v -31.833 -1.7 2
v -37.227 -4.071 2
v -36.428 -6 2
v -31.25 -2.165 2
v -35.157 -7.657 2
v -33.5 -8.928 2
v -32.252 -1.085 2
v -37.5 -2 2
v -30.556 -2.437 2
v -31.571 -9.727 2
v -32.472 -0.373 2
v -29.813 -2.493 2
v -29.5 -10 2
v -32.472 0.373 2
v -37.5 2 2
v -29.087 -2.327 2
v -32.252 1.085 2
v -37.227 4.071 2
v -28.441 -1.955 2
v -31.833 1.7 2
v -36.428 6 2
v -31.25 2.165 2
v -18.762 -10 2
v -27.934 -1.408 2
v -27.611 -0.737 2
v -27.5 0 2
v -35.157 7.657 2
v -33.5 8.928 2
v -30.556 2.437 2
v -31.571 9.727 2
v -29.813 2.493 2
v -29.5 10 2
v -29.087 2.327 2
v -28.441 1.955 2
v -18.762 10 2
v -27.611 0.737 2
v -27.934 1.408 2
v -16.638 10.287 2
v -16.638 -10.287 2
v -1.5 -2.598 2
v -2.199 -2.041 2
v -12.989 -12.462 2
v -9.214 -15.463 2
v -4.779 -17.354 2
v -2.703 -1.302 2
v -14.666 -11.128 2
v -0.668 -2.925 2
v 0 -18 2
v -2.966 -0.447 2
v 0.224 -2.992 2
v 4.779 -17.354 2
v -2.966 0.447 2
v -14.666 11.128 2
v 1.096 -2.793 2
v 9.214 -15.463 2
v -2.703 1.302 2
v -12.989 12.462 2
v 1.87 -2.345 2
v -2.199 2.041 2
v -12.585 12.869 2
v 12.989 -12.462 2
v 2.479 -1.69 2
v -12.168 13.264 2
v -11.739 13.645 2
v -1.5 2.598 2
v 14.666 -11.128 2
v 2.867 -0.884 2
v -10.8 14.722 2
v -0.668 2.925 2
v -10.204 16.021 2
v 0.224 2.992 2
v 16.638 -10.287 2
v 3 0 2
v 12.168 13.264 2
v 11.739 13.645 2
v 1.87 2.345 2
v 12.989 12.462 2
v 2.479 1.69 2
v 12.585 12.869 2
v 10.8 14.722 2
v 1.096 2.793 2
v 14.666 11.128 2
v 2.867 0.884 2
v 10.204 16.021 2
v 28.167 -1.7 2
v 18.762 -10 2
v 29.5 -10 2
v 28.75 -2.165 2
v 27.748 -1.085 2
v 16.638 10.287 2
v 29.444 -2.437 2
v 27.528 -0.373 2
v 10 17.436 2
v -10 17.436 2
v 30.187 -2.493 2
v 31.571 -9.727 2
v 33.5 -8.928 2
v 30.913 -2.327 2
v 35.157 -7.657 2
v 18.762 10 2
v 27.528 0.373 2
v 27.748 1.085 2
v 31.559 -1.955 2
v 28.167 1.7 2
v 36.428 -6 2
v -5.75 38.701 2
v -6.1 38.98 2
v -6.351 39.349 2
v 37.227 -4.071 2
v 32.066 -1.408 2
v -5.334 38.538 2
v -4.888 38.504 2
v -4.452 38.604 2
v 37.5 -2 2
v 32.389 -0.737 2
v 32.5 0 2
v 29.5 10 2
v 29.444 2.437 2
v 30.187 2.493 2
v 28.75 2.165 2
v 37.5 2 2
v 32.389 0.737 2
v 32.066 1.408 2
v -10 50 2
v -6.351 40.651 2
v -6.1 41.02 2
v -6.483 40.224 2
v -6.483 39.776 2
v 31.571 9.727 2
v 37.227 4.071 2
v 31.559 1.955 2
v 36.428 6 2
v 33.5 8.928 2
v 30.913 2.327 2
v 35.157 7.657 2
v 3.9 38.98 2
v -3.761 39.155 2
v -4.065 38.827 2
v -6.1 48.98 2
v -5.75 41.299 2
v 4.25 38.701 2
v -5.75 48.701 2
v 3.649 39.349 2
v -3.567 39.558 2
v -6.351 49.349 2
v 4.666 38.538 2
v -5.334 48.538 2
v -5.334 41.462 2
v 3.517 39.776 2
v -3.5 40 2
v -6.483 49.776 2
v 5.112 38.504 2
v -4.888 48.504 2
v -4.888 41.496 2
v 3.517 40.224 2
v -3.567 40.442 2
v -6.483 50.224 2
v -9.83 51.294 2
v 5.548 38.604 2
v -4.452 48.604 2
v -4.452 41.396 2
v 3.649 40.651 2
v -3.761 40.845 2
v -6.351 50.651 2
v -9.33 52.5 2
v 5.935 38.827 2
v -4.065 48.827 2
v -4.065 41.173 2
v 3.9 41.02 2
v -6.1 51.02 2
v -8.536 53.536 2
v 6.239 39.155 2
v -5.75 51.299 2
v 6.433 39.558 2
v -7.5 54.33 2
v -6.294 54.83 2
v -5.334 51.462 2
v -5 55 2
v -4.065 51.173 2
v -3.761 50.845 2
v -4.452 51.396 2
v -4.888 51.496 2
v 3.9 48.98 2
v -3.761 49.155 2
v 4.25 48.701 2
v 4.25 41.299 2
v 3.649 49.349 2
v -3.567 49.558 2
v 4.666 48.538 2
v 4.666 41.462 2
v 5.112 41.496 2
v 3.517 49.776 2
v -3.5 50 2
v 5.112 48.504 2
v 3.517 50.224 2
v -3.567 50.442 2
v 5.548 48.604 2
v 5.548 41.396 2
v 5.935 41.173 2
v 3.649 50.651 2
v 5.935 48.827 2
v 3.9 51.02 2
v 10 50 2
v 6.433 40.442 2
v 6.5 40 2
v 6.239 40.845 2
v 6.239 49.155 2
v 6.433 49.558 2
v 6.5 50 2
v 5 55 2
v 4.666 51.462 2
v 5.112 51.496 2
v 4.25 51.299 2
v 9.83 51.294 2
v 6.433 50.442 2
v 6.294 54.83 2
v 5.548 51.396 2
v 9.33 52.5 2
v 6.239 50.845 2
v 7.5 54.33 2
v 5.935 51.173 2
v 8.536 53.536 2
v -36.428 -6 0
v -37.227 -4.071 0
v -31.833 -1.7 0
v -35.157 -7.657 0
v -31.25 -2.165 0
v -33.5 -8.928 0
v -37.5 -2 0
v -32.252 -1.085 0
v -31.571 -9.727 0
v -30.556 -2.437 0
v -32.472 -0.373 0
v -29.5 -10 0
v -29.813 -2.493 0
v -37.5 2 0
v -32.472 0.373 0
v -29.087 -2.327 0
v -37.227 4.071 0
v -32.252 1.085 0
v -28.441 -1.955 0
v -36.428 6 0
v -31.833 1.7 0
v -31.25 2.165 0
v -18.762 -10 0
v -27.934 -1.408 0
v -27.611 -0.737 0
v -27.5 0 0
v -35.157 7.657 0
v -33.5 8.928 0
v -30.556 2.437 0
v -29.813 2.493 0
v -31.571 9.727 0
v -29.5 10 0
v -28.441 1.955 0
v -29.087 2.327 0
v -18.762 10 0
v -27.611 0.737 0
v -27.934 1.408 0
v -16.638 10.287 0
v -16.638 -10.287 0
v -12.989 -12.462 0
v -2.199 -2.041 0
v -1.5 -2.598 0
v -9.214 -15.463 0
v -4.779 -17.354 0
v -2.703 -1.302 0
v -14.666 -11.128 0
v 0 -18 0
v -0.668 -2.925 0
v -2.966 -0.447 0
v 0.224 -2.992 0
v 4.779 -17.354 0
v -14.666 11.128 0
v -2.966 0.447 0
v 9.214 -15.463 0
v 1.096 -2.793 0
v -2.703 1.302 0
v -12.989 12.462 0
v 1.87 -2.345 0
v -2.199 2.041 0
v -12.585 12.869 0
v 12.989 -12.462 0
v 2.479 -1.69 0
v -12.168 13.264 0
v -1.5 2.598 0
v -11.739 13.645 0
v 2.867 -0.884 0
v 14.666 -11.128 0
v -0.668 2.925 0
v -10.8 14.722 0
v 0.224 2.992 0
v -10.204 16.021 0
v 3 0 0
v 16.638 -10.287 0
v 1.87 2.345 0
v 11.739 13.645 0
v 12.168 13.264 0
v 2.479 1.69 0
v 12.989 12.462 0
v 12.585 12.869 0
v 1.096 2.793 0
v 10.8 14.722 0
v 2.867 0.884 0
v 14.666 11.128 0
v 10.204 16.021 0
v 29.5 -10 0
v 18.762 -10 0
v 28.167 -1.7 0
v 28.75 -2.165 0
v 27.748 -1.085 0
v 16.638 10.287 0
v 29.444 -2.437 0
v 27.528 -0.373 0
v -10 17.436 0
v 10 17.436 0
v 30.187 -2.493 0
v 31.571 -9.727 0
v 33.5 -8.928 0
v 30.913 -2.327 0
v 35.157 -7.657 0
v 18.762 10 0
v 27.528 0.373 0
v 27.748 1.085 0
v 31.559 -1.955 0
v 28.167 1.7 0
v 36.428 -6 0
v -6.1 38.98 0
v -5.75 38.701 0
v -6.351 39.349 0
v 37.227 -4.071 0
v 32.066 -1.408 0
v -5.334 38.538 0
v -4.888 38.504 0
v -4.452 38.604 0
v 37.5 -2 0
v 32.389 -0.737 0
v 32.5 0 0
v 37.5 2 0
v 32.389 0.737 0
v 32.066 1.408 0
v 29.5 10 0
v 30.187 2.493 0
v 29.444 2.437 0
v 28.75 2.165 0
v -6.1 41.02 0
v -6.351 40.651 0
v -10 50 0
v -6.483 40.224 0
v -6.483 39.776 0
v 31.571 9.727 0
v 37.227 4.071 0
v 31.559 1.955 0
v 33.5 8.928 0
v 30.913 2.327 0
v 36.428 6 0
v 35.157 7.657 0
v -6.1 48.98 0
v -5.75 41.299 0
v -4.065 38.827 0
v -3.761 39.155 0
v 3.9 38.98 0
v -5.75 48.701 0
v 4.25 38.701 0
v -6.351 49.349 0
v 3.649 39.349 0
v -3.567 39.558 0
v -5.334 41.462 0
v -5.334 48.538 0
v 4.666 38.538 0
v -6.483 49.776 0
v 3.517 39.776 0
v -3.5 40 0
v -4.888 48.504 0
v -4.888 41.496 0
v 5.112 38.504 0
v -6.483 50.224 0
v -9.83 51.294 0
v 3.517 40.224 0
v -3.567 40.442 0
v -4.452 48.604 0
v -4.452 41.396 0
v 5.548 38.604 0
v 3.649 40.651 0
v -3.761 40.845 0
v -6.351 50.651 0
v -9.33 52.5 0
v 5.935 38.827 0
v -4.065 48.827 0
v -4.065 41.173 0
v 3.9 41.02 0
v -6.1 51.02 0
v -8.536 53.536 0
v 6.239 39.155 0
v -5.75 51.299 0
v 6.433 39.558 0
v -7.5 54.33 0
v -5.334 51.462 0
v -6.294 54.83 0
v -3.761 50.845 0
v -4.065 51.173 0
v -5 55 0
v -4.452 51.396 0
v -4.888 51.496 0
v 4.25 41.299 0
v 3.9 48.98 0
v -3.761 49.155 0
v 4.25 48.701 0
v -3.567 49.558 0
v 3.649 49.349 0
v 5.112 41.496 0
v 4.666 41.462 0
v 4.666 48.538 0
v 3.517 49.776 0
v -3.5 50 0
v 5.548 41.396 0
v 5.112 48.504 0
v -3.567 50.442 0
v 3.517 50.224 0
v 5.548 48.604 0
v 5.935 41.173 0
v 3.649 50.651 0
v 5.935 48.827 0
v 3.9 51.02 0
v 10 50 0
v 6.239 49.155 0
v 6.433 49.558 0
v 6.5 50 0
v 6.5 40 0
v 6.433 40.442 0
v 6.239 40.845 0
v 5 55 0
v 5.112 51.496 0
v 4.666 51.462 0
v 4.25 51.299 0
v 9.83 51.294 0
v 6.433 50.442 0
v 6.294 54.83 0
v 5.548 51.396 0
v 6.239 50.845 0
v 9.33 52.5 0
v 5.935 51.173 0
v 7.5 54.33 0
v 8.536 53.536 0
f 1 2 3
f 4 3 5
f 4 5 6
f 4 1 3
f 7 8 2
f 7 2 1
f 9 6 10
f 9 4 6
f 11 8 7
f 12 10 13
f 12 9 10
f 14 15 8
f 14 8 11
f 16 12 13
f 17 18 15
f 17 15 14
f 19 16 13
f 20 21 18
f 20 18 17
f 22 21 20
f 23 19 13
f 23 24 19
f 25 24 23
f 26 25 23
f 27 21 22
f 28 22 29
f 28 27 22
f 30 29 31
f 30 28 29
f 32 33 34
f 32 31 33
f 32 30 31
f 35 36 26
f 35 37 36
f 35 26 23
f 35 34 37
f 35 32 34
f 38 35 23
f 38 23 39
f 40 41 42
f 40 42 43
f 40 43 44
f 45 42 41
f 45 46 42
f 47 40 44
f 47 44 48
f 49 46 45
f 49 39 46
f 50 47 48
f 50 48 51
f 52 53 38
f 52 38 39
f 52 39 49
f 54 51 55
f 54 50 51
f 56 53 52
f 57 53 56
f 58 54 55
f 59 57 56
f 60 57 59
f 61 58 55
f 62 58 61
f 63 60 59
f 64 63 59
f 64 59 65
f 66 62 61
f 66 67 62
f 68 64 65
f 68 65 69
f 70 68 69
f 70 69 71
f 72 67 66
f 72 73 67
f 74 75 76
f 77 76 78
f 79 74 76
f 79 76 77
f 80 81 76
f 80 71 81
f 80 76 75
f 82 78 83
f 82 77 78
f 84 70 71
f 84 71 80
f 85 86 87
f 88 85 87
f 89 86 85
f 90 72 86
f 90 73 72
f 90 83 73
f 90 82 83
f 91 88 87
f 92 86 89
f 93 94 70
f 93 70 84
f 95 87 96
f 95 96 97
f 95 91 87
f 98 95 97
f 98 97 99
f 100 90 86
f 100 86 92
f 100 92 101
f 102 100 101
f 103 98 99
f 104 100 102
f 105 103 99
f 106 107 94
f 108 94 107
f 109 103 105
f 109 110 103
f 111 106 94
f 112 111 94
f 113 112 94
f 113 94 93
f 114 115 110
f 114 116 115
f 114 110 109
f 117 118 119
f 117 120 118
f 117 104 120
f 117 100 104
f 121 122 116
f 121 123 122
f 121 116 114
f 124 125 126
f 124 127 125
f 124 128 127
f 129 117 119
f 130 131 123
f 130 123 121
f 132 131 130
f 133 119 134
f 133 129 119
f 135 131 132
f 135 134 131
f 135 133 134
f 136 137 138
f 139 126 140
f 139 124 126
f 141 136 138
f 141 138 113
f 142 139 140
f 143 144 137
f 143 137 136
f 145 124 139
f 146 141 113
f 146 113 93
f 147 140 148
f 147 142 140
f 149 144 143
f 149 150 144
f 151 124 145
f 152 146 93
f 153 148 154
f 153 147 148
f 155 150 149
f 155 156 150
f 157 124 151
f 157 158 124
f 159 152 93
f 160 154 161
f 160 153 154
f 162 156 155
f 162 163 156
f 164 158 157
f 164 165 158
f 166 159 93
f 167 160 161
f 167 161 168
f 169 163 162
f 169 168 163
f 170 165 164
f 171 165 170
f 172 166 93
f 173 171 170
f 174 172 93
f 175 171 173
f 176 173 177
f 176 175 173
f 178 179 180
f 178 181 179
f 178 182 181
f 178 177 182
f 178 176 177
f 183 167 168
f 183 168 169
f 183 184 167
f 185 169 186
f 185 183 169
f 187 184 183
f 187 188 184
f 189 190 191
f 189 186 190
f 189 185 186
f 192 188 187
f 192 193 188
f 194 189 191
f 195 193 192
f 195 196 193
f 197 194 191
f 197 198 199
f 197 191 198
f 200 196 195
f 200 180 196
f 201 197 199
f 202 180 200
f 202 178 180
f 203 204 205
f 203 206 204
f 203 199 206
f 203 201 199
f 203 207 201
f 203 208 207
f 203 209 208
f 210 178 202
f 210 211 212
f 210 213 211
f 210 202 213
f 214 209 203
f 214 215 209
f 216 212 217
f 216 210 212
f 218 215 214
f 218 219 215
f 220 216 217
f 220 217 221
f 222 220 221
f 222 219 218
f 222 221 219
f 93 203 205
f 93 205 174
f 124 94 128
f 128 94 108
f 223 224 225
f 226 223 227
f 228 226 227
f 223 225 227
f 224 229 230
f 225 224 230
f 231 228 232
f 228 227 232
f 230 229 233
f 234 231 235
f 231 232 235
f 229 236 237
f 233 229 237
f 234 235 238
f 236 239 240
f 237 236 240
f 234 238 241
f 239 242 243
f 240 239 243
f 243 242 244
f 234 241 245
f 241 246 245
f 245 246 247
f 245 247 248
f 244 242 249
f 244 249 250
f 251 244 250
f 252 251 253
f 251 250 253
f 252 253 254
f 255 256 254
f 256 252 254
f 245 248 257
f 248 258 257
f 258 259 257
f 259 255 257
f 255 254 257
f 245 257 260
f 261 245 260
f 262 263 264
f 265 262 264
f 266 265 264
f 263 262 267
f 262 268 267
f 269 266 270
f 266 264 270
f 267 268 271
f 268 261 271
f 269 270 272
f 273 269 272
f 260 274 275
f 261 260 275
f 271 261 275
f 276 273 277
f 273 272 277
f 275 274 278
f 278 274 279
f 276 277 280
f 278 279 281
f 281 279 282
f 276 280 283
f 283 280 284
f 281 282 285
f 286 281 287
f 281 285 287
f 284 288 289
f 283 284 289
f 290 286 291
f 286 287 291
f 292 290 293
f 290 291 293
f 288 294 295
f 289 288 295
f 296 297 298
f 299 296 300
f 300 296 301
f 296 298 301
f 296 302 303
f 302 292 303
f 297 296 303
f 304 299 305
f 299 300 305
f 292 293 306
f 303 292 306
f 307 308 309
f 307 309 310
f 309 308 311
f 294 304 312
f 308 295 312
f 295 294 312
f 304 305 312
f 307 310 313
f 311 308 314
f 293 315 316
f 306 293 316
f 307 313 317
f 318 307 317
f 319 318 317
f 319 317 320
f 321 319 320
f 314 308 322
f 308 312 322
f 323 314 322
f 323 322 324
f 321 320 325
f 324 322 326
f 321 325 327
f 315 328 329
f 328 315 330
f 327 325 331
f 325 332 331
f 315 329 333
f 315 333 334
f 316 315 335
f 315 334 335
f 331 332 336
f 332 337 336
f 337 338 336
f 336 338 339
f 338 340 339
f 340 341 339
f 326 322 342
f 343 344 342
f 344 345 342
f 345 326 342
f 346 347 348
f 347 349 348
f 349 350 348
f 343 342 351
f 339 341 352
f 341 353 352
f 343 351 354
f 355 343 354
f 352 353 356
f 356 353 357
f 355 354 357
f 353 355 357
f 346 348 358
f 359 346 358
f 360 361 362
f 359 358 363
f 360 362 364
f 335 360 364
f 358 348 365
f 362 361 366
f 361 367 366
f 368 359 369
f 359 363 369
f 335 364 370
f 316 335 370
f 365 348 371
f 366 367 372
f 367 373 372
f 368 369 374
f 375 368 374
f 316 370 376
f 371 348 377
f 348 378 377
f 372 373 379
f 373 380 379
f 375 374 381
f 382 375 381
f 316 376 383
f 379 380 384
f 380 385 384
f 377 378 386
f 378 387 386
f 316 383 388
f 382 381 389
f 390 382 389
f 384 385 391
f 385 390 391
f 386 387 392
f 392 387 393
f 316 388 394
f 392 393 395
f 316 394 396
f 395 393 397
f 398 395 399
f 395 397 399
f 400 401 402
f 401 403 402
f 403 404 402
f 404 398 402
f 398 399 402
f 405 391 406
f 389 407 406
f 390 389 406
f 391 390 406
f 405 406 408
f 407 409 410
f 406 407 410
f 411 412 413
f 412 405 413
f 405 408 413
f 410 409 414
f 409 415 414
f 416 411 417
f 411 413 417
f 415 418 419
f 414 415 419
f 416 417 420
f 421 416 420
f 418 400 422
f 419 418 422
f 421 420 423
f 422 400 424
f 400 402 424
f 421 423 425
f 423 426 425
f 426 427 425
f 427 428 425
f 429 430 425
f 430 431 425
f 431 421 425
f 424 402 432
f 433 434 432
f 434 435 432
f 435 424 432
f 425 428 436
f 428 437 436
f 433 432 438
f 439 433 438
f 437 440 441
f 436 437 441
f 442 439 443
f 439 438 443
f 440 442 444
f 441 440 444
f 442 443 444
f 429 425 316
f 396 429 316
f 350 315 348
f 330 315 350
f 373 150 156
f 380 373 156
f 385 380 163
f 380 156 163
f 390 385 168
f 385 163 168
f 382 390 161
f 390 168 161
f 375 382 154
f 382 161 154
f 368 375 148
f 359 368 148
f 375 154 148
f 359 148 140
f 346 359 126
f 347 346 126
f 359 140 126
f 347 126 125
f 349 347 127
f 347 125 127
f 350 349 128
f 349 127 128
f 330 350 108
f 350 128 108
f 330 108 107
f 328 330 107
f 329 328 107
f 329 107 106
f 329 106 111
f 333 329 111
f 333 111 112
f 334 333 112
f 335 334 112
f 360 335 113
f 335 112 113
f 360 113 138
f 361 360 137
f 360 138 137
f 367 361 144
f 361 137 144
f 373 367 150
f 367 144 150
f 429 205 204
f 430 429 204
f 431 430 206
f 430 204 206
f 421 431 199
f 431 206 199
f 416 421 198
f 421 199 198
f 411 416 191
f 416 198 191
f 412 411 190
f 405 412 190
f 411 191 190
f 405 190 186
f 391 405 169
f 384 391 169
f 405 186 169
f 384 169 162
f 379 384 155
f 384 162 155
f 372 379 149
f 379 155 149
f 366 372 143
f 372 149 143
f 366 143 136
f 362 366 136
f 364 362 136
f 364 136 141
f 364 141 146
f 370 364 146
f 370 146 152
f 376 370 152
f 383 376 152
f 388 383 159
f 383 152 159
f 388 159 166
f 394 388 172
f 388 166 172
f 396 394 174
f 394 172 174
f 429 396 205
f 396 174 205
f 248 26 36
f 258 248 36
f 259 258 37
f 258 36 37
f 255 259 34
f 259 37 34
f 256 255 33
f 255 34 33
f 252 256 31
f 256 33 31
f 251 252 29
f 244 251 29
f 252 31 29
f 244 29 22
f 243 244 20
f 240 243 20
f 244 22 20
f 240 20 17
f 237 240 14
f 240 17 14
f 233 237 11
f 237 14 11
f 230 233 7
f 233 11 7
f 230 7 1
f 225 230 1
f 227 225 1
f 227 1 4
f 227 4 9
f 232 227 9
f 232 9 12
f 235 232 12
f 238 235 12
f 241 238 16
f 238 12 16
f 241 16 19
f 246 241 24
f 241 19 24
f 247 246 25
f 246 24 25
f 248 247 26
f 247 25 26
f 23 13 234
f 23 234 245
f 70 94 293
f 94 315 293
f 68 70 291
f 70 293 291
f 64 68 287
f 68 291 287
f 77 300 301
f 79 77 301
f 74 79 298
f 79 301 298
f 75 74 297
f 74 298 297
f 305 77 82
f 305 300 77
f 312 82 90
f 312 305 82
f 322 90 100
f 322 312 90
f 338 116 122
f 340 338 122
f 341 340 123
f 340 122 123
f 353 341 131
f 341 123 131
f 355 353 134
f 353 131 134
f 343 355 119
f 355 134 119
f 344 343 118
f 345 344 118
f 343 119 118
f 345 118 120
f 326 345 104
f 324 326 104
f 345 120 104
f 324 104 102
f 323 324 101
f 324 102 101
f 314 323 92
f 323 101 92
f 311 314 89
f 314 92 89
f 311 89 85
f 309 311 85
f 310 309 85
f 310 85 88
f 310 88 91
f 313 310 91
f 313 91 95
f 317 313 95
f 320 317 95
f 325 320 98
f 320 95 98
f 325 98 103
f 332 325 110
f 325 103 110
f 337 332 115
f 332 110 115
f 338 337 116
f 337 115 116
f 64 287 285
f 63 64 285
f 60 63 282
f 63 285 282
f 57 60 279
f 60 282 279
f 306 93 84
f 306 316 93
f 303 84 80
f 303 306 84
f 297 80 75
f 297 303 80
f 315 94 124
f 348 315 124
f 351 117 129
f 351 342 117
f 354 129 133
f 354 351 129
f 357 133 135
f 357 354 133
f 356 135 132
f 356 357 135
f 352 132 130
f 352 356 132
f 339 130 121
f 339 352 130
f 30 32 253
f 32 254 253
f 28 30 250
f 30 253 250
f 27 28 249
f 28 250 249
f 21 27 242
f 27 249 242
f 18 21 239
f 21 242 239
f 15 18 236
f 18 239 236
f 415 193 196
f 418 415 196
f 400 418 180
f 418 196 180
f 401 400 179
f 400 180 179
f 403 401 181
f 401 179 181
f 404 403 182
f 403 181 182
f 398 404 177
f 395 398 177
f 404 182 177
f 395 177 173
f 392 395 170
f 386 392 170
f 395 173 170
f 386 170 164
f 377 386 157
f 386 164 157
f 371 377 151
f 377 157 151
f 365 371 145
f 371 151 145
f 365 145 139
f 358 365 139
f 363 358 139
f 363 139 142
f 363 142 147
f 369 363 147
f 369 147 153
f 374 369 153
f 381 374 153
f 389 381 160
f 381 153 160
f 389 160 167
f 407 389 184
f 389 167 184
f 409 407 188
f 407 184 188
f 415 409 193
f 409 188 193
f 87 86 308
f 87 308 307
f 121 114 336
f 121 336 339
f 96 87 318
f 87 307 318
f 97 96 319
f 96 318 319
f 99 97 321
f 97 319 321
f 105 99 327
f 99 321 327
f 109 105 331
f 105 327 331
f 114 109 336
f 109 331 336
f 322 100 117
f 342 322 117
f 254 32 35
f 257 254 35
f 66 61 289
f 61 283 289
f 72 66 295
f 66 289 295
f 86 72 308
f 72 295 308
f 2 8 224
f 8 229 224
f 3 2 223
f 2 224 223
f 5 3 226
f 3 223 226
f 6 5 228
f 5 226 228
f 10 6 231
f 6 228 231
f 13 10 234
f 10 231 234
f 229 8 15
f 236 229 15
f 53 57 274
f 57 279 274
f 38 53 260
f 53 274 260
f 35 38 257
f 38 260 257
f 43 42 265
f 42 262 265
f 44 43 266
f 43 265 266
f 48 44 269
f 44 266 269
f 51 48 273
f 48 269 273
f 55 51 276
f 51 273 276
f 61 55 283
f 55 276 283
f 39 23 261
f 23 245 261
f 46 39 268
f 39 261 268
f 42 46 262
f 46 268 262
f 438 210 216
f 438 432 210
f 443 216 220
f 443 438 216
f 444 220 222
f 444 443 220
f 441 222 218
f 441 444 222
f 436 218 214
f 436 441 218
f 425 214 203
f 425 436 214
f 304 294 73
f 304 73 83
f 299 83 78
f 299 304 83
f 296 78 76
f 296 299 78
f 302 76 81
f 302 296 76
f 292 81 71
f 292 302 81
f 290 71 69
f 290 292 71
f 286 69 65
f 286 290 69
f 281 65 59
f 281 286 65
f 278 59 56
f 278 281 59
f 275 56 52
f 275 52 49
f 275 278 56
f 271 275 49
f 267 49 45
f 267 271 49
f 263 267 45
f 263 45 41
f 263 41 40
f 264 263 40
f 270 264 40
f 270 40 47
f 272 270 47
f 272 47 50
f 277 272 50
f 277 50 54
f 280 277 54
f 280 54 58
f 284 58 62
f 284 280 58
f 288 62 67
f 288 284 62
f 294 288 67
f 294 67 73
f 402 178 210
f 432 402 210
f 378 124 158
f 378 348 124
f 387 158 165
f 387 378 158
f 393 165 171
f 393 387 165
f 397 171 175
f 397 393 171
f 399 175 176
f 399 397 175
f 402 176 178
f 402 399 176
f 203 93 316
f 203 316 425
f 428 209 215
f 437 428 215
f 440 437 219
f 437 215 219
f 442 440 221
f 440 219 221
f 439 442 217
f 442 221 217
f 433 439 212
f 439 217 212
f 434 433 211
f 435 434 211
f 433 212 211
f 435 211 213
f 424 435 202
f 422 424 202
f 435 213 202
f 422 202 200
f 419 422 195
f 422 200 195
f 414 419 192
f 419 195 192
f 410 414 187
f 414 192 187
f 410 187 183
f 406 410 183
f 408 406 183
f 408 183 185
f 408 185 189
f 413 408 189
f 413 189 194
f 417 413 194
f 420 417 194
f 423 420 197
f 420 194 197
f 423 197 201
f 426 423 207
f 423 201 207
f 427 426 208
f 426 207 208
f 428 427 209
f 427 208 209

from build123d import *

# Parameters (mm, degrees)
SKETCH_1_R      = 18
SKETCH_1_R_2    = 3
EXTRUDE_1_DEPTH = 2
SKETCH_2_W      = 22.533370453
SKETCH_2_H      = 20
SKETCH_2_R      = 2.5
EXTRUDE_2_DEPTH = 2
SKETCH_3_W      = 20
SKETCH_3_H      = 45
SKETCH_3_R      = 1.5
EXTRUDE_3_DEPTH = 2
FILLET_1_R      = 5
FILLET_2_R      = 8


with BuildPart() as part:
    # 草图1 → 凸台-拉伸1 (new body)
    with BuildSketch(Plane.XY):
        Circle(SKETCH_1_R)
        Circle(SKETCH_1_R_2, mode=Mode.SUBTRACT)
    extrude(amount=EXTRUDE_1_DEPTH)

    # 草图2 → 凸台-拉伸2 (add)
    # profile 1 of 2: a face of its own
    with BuildSketch(Plane.XY.offset(2)):
        with Locations((-26.233314773, 0)):
            Rectangle(SKETCH_2_W, SKETCH_2_H)
        with Locations((-30, 0)):
            Circle(SKETCH_2_R, mode=Mode.SUBTRACT)
    # profile 2 of 2: a face of its own
    with BuildSketch(Plane.XY.offset(2)):
        with Locations((26.233314773, 0)):
            Rectangle(SKETCH_2_W, SKETCH_2_H)
        with Locations((30, 0)):
            Circle(SKETCH_2_R, mode=Mode.SUBTRACT)
    extrude(amount=-EXTRUDE_2_DEPTH)

    # 草图3 → 凸台-拉伸3 (add)
    with BuildSketch(Plane.XY.offset(2)):
        with Locations((0, 32.5)):
            Rectangle(SKETCH_3_W, SKETCH_3_H)
        with Locations((-5, 50)):
            Circle(SKETCH_3_R, mode=Mode.SUBTRACT)
        with Locations((-5, 40)):
            Circle(SKETCH_3_R, mode=Mode.SUBTRACT)
        with Locations((5, 40)):
            Circle(SKETCH_3_R, mode=Mode.SUBTRACT)
        with Locations((5, 50)):
            Circle(SKETCH_3_R, mode=Mode.SUBTRACT)
    extrude(amount=-EXTRUDE_3_DEPTH)

    # 圆角1
    fillet_1_edges = [part.edges().sort_by_distance(p)[0] for p in [
        (-10, 14.966629547, 1),
        (10, 14.966629547, 1),
        (10, 55, 1),
        (-10, 55, 1),
    ]]
    fillet(fillet_1_edges, radius=FILLET_1_R)

    # 圆角2
    fillet_2_edges = [part.edges().sort_by_distance(p)[0] for p in [
        (37.5, -10, 1),
        (14.966629547, -10, 1),
        (14.966629547, 10, 1),
        (37.5, 10, 1),
        (-37.5, 10, 1),
        (-14.966629547, 10, 1),
        (-14.966629547, -10, 1),
        (-37.5, -10, 1),
    ]]
    fillet(fillet_2_edges, radius=FILLET_2_R)


solid = part.part
